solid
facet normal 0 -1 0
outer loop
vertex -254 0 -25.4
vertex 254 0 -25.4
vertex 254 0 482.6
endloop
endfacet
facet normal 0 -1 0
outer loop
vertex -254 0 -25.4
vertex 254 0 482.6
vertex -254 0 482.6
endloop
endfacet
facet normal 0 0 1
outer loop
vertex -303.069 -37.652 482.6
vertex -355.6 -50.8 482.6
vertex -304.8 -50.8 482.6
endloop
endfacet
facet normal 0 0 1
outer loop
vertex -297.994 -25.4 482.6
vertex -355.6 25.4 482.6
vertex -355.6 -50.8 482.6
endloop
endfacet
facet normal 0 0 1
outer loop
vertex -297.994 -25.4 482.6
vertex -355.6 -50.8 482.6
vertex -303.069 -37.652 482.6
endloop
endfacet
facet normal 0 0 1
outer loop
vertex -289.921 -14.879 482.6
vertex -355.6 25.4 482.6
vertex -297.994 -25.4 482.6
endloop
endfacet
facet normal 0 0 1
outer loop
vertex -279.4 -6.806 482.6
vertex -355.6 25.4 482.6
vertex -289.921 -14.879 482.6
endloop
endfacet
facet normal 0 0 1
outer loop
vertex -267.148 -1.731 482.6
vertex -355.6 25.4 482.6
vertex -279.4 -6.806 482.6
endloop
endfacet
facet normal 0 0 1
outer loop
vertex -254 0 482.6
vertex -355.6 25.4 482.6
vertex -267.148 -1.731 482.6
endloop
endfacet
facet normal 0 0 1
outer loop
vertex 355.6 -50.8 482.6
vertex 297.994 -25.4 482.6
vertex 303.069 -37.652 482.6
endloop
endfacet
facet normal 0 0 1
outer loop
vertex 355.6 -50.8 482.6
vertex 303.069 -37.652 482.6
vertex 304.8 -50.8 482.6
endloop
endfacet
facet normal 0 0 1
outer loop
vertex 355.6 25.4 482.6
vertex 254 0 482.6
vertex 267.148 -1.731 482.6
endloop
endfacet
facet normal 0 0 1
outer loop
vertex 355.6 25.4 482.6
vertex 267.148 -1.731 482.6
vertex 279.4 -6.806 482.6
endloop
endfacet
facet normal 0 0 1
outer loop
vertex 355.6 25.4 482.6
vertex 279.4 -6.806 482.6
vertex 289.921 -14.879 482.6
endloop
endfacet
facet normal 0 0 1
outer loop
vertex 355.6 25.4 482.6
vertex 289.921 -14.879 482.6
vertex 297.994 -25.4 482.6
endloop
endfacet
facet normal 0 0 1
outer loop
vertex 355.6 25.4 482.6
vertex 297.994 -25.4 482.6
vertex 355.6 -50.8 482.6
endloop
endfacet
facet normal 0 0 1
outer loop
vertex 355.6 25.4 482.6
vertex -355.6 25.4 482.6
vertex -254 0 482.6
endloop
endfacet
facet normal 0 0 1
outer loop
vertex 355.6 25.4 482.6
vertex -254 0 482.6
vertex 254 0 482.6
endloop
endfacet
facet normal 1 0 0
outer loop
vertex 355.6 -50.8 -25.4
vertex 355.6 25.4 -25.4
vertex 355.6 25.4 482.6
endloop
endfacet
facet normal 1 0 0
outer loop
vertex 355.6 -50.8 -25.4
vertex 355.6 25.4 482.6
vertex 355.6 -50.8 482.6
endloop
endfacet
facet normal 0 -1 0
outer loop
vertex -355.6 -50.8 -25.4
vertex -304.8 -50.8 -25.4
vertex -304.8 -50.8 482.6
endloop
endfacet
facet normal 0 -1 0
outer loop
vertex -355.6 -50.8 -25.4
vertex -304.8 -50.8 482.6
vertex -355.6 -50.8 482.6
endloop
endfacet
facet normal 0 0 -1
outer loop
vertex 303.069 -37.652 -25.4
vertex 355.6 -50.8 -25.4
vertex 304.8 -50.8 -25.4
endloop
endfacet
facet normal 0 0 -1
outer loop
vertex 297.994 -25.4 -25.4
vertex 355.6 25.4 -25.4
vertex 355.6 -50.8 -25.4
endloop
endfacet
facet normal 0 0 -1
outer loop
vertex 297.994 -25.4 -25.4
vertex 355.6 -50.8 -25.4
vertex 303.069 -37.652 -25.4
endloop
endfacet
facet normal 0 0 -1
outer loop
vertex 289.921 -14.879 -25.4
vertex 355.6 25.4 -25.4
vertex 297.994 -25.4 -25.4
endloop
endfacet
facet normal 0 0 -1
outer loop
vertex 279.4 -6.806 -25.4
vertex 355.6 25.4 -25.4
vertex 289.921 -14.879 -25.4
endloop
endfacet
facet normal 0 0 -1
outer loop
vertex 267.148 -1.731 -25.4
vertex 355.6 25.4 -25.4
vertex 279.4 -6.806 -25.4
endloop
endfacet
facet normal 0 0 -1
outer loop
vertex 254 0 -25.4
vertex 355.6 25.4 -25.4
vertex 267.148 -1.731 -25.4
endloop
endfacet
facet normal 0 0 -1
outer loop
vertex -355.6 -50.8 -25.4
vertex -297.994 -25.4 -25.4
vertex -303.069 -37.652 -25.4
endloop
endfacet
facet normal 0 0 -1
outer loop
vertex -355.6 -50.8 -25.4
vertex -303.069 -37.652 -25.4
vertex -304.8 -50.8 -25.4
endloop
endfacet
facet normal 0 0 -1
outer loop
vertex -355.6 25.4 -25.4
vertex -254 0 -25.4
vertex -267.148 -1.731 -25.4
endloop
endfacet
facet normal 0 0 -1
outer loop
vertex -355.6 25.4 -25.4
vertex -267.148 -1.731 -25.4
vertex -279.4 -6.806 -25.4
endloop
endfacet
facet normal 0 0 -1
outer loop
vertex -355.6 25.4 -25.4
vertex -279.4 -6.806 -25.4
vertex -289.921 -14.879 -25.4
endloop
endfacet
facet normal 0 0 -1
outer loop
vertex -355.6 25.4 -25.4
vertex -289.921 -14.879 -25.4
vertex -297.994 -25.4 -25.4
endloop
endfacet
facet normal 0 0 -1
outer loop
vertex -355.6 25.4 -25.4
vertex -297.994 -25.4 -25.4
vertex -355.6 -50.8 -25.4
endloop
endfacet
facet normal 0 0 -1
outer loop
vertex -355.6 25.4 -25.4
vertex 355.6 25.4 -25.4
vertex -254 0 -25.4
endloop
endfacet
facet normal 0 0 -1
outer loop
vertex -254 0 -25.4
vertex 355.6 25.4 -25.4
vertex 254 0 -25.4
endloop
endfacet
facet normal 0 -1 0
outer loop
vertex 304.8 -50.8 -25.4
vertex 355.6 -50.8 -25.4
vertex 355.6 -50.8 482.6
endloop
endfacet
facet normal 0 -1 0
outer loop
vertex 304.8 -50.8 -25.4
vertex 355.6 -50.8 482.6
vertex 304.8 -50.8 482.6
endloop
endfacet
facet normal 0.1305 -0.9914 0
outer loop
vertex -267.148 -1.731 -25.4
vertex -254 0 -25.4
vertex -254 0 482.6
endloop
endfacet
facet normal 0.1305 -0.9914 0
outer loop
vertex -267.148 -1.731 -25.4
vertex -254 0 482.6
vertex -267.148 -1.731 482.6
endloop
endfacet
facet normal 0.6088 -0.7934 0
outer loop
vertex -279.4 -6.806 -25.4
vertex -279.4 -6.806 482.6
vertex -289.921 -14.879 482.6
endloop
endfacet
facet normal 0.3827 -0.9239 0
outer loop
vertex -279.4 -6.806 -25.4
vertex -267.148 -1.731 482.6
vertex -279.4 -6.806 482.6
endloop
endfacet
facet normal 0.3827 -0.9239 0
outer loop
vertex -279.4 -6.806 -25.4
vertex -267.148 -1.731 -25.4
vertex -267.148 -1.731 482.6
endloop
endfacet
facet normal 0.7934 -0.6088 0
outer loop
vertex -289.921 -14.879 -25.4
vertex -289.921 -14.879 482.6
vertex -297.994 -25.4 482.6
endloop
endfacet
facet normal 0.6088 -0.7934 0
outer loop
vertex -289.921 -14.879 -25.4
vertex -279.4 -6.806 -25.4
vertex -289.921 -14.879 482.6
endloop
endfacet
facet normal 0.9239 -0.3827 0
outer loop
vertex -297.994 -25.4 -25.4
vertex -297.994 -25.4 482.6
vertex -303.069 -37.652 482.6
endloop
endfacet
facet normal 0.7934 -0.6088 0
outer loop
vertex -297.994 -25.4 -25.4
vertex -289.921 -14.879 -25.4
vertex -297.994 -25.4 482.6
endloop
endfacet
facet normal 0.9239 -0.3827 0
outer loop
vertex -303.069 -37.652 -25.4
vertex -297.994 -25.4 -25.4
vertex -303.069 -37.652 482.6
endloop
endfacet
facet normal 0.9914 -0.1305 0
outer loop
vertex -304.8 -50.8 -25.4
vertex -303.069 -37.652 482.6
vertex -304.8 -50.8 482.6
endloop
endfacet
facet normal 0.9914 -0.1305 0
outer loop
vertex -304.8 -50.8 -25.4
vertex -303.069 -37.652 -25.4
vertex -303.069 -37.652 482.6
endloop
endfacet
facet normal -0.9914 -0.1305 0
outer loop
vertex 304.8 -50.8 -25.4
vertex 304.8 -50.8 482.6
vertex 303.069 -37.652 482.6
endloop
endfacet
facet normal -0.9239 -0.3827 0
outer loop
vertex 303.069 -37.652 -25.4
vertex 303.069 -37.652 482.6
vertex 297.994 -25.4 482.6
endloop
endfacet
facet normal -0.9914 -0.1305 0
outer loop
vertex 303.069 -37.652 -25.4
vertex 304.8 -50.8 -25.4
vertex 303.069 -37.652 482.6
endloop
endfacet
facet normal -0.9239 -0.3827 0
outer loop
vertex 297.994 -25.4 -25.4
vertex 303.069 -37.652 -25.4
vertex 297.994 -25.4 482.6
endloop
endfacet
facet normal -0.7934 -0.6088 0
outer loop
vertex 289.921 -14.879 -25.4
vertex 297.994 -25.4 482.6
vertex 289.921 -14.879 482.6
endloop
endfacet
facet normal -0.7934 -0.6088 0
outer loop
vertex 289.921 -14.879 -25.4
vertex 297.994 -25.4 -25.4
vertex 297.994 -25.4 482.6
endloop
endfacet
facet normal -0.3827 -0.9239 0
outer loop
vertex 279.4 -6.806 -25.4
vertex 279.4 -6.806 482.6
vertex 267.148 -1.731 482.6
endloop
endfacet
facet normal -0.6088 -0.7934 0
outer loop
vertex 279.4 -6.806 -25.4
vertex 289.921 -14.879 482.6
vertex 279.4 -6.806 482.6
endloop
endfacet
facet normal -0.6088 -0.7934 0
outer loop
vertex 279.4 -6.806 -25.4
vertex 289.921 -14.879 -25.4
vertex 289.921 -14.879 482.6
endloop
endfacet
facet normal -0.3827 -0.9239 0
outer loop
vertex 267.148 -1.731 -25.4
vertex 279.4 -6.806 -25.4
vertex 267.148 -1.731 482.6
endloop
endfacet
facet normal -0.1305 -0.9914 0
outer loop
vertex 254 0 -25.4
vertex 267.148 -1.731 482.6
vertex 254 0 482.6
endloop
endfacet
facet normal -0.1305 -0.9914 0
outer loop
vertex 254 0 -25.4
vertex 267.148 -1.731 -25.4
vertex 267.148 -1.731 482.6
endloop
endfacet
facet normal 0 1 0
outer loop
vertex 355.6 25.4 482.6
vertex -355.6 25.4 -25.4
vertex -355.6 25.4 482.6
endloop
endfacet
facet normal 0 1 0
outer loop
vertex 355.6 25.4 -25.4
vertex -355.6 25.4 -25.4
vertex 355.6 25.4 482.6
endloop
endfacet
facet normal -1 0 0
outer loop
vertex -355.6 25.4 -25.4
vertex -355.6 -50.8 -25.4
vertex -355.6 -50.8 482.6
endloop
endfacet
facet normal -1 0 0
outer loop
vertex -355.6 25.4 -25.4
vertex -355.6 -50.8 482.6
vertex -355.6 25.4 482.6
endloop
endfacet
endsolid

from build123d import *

# Parameters (mm, degrees)
STOCK_DECKMOLD_1_DEPTH = 457.2
SKETCH1_W              = 457.2
SKETCH1_H              = 76.2
BOSS_EXTRUDE1_DEPTH    = 50.8
SKETCH2_W              = 457.2
SKETCH2_H              = 76.2
BOSS_EXTRUDE2_DEPTH    = 50.8
BOSS_EXTRUDE4_DEPTH    = 25.4
BOSS_EXTRUDE5_START    = 25.4
BOSS_EXTRUDE5_DEPTH    = 25.4


# Read off the part's stored shape, not the designer's step: Stock-deckmold-1
with BuildPart() as part:
    # Stock-deckmold-1 outline → Stock-deckmold-1 (new body)
    with BuildSketch(Plane.XY):
        with BuildLine():
            Line((304.8, 25.4), (-304.8, 25.4))
            Line((-304.8, 25.4), (-304.8, -50.8))
            ThreePointArc((-304.8, -50.8), (-289.921024484, -14.878975516), (-254, 0))
            Line((-254, 0), (254, 0))
            ThreePointArc((254, 0), (289.921024484, -14.878975516), (304.8, -50.8))
            Line((304.8, -50.8), (304.8, 25.4))
        make_face()
    extrude(amount=STOCK_DECKMOLD_1_DEPTH)

    # Sketch1 → Boss-Extrude1 (add)
    with BuildSketch(Plane(origin=(304.8, 0, 0), x_dir=(0, 0, -1), z_dir=(1, 0, 0))):
        with Locations((-228.6, -12.7)):
            Rectangle(SKETCH1_W, SKETCH1_H)
    extrude(amount=BOSS_EXTRUDE1_DEPTH)

    # Sketch2 → Boss-Extrude2 (add)
    with BuildSketch(Plane.ZY.offset(304.8)):
        with Locations((228.6, -12.7)):
            Rectangle(SKETCH2_W, SKETCH2_H)
    extrude(amount=BOSS_EXTRUDE2_DEPTH)

    # Sketch3 → Boss-Extrude4 (add)
    with BuildSketch(Plane.XY.offset(457.2)):
        with BuildLine():
            Line((355.6, -50.8), (355.6, 25.4))
            Line((355.6, 25.4), (-355.6, 25.4))
            Line((-355.6, 25.4), (-355.6, -50.8))
            Line((-355.6, -50.8), (-304.8, -50.8))
            ThreePointArc((-304.8, -50.8), (-289.921024484, -14.878975516), (-254, 0))
            Line((-254, 0), (254, 0))
            ThreePointArc((254, 0), (289.921024484, -14.878975516), (304.8, -50.8))
            Line((304.8, -50.8), (355.6, -50.8))
        make_face()
    extrude(amount=BOSS_EXTRUDE4_DEPTH)

    # Sketch4 → Boss-Extrude5 (add)
    with BuildSketch(Plane(origin=(0, 0, 0), x_dir=(-1, 0, 0), z_dir=(0, 0, -1)).offset(BOSS_EXTRUDE5_START)):
        with BuildLine():
            Line((-254, 0), (254, 0))
            ThreePointArc((254, 0), (289.921024484, -14.878975516), (304.8, -50.8))
            Line((304.8, -50.8), (355.6, -50.8))
            Line((355.6, -50.8), (355.6, 25.4))
            Line((355.6, 25.4), (-355.6, 25.4))
            Line((-355.6, 25.4), (-355.6, -50.8))
            Line((-355.6, -50.8), (-304.8, -50.8))
            ThreePointArc((-304.8, -50.8), (-289.921024484, -14.878975516), (-254, 0))
        make_face()
    extrude(amount=-BOSS_EXTRUDE5_DEPTH)


solid = part.part
